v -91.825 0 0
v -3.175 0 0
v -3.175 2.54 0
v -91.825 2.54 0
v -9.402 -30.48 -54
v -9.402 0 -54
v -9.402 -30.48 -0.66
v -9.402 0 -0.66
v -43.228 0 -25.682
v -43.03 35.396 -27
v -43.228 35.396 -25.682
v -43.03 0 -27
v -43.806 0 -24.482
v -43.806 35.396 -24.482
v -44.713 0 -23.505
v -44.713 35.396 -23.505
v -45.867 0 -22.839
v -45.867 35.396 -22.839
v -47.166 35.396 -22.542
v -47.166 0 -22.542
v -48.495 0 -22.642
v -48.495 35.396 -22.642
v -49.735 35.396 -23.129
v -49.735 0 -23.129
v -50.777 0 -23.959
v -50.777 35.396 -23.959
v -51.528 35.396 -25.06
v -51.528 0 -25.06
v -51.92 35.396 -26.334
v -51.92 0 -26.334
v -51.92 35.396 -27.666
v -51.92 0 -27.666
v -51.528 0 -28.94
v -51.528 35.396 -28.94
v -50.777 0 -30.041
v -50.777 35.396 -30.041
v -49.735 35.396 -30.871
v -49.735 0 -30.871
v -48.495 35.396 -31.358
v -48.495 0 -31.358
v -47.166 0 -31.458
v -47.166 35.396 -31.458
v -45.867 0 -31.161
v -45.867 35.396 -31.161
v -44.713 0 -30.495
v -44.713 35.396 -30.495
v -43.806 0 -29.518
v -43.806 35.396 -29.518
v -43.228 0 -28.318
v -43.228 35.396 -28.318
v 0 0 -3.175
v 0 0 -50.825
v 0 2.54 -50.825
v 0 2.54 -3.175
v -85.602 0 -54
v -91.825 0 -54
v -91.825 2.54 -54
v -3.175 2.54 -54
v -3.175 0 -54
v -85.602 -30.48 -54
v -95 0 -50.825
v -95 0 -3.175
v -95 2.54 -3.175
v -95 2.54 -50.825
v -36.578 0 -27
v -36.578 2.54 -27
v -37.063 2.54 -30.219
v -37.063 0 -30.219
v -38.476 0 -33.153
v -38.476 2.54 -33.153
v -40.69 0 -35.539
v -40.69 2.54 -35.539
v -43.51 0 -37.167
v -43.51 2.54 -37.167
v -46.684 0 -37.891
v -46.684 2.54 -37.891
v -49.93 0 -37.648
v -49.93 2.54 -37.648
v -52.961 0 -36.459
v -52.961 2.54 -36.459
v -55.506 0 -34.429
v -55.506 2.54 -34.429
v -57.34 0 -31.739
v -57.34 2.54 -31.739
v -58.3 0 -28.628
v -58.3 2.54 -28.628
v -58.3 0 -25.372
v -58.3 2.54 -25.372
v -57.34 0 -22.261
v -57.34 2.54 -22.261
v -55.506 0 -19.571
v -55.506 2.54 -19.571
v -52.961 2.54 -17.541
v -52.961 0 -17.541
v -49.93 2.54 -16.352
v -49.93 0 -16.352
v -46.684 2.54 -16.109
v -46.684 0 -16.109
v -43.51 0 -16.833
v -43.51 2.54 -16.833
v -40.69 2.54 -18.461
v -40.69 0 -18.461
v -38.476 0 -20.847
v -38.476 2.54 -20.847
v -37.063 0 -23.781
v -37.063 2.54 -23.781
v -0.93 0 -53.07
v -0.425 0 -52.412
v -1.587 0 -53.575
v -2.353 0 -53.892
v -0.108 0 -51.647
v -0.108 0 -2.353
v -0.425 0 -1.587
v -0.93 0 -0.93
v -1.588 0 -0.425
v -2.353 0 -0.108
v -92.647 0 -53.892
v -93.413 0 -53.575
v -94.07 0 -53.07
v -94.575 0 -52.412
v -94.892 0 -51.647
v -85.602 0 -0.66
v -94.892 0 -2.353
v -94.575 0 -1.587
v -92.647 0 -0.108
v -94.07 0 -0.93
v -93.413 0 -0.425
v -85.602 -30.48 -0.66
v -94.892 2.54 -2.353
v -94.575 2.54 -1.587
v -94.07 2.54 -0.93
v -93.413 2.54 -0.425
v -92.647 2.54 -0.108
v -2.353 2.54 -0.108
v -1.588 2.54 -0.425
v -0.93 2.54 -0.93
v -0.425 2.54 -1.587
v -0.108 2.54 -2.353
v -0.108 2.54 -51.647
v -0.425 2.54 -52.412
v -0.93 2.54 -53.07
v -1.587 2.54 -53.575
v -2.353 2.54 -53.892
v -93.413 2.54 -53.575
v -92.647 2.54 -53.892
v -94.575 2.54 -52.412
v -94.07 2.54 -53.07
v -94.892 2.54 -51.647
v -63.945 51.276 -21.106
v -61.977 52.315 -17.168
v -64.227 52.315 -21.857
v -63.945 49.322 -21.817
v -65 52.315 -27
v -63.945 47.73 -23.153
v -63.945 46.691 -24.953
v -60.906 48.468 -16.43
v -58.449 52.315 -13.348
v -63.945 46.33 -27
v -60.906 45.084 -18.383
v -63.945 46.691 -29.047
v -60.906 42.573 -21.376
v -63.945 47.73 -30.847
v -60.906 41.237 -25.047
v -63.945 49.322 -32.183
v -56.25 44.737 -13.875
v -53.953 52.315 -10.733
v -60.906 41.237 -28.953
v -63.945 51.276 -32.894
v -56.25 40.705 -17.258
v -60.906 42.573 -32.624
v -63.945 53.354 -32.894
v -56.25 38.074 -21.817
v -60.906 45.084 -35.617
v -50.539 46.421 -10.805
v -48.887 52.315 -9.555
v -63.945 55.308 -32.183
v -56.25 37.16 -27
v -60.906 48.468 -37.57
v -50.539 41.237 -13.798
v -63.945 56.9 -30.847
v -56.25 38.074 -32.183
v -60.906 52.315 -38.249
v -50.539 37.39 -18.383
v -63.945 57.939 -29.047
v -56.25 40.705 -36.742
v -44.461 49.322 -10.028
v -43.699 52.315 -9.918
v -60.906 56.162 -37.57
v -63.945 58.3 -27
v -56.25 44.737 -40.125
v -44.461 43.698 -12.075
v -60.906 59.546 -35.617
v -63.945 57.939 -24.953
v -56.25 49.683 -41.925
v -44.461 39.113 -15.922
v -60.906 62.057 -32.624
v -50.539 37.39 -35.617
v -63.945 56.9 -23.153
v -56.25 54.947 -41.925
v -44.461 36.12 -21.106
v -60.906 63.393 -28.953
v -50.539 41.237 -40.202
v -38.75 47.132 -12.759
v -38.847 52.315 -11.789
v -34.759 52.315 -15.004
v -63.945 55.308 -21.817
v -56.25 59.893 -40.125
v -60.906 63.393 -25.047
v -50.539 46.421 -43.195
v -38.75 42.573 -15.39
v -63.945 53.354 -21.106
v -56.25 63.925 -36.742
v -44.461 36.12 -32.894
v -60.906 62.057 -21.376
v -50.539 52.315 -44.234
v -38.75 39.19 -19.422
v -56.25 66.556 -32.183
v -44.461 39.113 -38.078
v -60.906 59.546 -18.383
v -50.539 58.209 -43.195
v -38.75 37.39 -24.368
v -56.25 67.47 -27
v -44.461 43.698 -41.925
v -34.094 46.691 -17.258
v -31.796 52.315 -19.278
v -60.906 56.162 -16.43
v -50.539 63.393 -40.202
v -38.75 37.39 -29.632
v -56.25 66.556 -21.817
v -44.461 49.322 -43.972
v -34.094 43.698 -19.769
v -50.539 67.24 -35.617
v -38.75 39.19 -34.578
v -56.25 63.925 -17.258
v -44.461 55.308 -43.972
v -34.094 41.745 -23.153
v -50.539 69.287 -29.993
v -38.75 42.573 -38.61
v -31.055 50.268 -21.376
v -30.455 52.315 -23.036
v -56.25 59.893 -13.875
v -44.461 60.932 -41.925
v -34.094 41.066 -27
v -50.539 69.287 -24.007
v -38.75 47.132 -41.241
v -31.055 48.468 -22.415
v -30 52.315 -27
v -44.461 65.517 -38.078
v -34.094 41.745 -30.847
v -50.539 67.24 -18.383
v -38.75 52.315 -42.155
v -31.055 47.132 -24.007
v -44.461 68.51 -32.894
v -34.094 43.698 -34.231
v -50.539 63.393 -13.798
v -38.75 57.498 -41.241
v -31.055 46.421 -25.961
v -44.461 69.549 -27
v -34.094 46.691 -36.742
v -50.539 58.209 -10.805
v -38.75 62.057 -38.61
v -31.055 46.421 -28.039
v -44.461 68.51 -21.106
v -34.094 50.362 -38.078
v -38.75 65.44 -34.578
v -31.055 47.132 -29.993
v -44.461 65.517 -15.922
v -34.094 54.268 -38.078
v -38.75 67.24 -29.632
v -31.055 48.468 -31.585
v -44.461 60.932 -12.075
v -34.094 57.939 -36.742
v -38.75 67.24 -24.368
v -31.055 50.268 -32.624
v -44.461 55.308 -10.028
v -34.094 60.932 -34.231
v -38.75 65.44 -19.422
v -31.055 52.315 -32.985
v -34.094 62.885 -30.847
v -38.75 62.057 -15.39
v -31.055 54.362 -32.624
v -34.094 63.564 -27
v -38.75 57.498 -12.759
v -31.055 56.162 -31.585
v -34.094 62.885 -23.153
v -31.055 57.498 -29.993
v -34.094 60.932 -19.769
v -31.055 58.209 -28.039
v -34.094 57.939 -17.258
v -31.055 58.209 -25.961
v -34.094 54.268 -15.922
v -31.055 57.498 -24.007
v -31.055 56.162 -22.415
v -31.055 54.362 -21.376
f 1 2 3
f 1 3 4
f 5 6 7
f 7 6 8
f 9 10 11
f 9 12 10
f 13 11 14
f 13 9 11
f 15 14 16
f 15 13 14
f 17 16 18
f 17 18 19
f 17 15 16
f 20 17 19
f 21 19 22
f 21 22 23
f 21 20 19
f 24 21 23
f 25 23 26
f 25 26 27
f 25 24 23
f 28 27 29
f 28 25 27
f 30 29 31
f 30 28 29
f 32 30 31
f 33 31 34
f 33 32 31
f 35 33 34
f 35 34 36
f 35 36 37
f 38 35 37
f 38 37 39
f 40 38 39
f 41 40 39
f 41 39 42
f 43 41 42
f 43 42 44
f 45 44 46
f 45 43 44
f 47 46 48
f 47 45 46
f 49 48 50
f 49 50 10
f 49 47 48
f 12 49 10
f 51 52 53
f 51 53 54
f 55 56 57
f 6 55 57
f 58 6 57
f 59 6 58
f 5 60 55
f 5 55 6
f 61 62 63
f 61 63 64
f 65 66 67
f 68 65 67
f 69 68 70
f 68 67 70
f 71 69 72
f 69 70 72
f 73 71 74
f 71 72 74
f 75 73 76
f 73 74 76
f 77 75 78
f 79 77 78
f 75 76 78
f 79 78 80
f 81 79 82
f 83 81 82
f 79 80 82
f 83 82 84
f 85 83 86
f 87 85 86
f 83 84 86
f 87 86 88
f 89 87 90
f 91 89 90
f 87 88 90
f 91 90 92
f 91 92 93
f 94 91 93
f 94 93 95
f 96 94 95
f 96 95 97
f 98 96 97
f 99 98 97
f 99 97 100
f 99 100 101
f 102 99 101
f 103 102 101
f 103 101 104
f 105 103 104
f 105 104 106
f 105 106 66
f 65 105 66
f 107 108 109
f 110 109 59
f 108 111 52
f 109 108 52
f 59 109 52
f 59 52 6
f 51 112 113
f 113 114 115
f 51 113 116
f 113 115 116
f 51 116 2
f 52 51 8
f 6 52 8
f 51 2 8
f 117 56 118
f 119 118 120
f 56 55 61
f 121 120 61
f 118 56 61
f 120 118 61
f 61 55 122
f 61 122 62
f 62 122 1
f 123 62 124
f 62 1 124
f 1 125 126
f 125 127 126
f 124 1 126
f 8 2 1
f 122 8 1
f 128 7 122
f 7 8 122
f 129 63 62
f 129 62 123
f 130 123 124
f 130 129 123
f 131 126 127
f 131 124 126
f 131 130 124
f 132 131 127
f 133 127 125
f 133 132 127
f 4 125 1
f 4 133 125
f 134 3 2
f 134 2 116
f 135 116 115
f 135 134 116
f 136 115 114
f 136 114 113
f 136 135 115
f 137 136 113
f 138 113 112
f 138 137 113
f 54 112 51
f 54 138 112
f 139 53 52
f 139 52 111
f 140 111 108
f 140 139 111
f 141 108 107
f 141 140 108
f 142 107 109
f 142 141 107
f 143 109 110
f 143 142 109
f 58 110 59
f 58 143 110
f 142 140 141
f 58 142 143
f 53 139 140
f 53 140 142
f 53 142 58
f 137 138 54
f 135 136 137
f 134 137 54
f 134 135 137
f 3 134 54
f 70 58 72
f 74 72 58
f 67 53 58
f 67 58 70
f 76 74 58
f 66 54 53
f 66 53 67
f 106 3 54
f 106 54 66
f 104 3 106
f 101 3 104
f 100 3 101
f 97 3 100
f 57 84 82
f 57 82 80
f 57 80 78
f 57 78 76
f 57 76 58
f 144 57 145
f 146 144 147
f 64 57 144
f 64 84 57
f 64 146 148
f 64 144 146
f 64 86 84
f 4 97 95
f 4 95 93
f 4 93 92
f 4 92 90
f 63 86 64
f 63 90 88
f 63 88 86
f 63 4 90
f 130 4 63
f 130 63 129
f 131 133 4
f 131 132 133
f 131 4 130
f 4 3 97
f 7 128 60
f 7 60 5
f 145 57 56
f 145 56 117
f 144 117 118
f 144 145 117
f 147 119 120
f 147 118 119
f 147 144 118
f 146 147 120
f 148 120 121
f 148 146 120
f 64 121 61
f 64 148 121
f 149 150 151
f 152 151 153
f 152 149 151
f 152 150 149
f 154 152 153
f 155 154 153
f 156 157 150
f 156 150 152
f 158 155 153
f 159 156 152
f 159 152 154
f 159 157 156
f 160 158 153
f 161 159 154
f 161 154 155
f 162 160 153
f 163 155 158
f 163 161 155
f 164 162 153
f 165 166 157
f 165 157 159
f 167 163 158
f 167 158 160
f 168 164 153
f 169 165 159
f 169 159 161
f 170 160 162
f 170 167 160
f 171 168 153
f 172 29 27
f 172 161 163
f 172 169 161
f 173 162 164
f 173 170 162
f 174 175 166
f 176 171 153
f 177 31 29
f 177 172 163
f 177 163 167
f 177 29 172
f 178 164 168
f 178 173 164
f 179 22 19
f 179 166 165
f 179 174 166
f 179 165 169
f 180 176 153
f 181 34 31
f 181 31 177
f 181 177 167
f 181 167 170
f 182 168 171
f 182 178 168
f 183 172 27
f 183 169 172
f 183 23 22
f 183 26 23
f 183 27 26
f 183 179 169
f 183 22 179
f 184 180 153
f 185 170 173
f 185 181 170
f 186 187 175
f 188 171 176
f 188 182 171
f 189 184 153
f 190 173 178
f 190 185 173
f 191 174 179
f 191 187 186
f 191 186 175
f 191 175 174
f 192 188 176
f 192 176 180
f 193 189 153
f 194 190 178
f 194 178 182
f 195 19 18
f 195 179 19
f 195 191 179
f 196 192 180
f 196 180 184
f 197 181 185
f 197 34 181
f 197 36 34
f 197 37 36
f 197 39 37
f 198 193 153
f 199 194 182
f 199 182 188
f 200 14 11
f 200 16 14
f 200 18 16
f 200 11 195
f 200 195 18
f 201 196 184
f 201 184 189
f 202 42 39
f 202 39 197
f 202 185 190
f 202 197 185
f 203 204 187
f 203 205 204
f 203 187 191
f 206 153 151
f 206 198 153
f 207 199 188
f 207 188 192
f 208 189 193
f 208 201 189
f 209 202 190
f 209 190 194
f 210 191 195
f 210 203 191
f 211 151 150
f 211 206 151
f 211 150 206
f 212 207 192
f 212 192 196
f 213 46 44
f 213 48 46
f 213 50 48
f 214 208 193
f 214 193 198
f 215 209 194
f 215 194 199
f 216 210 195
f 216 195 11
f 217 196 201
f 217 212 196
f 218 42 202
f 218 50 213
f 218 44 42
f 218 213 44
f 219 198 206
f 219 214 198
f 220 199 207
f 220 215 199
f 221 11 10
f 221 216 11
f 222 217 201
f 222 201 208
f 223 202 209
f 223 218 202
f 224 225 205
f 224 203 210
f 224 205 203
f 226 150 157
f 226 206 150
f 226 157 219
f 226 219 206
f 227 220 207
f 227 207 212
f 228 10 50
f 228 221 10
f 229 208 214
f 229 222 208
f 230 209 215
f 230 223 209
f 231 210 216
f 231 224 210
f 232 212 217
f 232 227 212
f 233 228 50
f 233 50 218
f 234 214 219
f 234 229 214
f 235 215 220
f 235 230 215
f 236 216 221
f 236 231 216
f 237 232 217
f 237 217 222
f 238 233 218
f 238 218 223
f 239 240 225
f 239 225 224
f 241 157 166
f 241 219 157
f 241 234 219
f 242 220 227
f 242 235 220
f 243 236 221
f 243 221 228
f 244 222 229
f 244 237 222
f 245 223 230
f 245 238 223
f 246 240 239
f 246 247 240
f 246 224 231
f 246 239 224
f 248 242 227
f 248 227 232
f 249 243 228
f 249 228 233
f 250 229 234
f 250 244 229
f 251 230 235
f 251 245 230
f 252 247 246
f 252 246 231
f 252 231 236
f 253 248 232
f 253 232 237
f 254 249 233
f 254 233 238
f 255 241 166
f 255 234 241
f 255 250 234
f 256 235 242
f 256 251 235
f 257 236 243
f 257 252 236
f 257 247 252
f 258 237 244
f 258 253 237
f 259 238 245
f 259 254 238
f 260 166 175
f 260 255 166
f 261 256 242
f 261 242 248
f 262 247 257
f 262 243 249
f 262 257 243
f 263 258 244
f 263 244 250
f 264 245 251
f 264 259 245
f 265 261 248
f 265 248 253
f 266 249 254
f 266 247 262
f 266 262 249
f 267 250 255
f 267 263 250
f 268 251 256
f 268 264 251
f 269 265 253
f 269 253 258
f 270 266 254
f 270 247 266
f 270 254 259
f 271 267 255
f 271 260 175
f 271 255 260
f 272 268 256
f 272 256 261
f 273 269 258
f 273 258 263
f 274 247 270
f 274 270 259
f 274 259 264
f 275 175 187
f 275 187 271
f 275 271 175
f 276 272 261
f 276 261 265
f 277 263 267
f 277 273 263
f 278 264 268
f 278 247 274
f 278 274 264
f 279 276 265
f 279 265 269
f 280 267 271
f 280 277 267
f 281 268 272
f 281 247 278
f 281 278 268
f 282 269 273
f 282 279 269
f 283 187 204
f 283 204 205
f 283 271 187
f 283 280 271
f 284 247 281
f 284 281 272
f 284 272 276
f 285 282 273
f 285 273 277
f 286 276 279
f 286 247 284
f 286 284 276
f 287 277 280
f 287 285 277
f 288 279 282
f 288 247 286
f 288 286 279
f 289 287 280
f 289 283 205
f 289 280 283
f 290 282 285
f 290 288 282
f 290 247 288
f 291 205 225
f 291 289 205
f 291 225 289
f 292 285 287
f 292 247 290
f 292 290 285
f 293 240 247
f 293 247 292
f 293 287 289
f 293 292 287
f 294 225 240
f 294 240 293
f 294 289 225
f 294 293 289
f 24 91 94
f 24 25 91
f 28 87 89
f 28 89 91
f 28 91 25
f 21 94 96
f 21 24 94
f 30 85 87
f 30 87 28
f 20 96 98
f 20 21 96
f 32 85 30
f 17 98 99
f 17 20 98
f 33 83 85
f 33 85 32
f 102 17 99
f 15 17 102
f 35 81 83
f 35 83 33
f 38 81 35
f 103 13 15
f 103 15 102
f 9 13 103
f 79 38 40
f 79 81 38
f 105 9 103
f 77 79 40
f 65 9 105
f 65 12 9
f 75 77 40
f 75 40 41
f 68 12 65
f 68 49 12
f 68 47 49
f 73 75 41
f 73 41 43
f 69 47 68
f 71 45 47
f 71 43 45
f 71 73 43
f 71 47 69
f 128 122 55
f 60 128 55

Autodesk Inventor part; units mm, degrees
ref_plane "YZ Plane" through (0, 0, 0) normal (1, 0, 0) x (0, 1, 0)
ref_plane "XZ Plane" through (0, 0, 0) normal (0, 1, 0) x (-1, 0, 0)
ref_plane "XY Plane" through (0, 0, 0) normal (0, 0, 1) x (1, 0, 0)
sketch "Sketch1" plane through (0, 0, 0) normal (0, 1, 0) x (-1, 0, 0)
  line L0 (0, 0) -> (95, 0)
  line L1 (95, 0) -> (95, -54)
  line L2 (95, -54) -> (0, -54)
  line L3 (0, -54) -> (0, 0)
  dimension "d0" = 95
  dimension "d1" = 54
extrude "Extrusion1" add sketch "Sketch1" along normal blind 2.54
fillet "Fillet1" radius 3.175 4 edges at (0, 1.27, 0) (-95, 1.27, 0) (0, 1.27, -54) (-95, 1.27, -54)
sketch "Sketch2" plane through (0, 0, 0) normal (0, -1, 0) x (1, 0, 0)
  arc A0 (-95, -50.825) -> (-91.825, -54) centre (-91.825, -50.825) ccw projected
  line L0 (-91.825, -54) -> (-3.175, -54) projected
  arc A1 (-3.175, -54) -> (0, -50.825) centre (-3.175, -50.825) ccw projected
  line L1 (0, -50.825) -> (0, -3.175) projected
  arc A2 (0, -3.175) -> (-3.175, 0) centre (-3.175, -3.175) ccw projected
  line L2 (-3.175, 0) -> (-91.825, 0) projected
  arc A3 (-91.825, 0) -> (-95, -3.175) centre (-91.825, -3.175) ccw projected
  line L3 (-95, -3.175) -> (-95, -50.825) projected
  line L4 (-85.602, -54) -> (-9.402, -54)
  line L5 (-9.402, -54) -> (-9.402, -0.66)
  line L6 (-9.402, -0.66) -> (-85.602, -0.66)
  line L7 (-85.602, -0.66) -> (-85.602, -54)
  point P0 (0, 0)
  dimension "d5" = 76.2
  dimension "d6" = 53.34
  dimension "d7" = 0
  dimension "d8" = 9.398
extrude "Extrusion2" add sketch "Sketch2" along normal blind 30.48 contours L7 L6 L5 L0
sketch "Sketch3" plane through (0, 2.54, 0) normal (0, 1, 0) x (1, 0, 0)
  arc A0 (-91.825, 54) -> (-95, 50.825) centre (-91.825, 50.825) ccw projected
  arc A1 (-91.825, 54) -> (-95, 50.825) centre (-91.825, 50.825) ccw projected
  line L0 (-95, 50.825) -> (-95, 3.175) projected
  arc A2 (-95, 3.175) -> (-91.825, 0) centre (-91.825, 3.175) ccw projected
  line L1 (-91.825, 0) -> (-3.175, 0) projected
  arc A3 (-3.175, 0) -> (0, 3.175) centre (-3.175, 3.175) ccw projected
  line L2 (0, 3.175) -> (0, 50.825) projected
  arc A4 (0, 50.825) -> (-3.175, 54) centre (-3.175, 50.825) ccw projected
  line L3 (-3.175, 54) -> (-91.825, 54) projected
  line L4 (-3.175, 3.175) -> (-91.825, 50.825)
  circle A5 centre (-47.5, 27) radius 10.922
  point P0 (0, 0)
  dimension "d11" = 21.844
extrude "Extrusion3" cut sketch "Sketch3" against normal blind 2.54 contours A5 L4 | L4 A5
sketch "Sketch4" plane through (-47.5, 0, -27) normal (0, 1, 0) x (1, 0, 0)
  circle A0 centre (0, 0) radius 4.4704
  point P0 (47.5, -27)
  dimension "d14" = 8.9408
extrude "Extrusion4" add sketch "Sketch4" along normal blind 43.815
ref_plane "Work Plane1" through (-47.5, 52.315, -27) normal (0, 1, 0) x (1, 0, 0)
sketch "Sketch5" plane through (-47.5, 52.315, -27) normal (0, 1, 0) x (1, 0, 0)
  arc A0 (-17.5, 0) -> (17.5, 0) centre (0, 0) ccw
  line L0 (17.5, 0) -> (-17.5, 0)
  point P0 (47.5, -27)
  dimension "d18" = 35
revolve "Revolution1" add sketch "Sketch5" angle 360 about axis through (-30, 52.315, -27) along (-1, 0, 0)
properties part number "Joy_Stick"
